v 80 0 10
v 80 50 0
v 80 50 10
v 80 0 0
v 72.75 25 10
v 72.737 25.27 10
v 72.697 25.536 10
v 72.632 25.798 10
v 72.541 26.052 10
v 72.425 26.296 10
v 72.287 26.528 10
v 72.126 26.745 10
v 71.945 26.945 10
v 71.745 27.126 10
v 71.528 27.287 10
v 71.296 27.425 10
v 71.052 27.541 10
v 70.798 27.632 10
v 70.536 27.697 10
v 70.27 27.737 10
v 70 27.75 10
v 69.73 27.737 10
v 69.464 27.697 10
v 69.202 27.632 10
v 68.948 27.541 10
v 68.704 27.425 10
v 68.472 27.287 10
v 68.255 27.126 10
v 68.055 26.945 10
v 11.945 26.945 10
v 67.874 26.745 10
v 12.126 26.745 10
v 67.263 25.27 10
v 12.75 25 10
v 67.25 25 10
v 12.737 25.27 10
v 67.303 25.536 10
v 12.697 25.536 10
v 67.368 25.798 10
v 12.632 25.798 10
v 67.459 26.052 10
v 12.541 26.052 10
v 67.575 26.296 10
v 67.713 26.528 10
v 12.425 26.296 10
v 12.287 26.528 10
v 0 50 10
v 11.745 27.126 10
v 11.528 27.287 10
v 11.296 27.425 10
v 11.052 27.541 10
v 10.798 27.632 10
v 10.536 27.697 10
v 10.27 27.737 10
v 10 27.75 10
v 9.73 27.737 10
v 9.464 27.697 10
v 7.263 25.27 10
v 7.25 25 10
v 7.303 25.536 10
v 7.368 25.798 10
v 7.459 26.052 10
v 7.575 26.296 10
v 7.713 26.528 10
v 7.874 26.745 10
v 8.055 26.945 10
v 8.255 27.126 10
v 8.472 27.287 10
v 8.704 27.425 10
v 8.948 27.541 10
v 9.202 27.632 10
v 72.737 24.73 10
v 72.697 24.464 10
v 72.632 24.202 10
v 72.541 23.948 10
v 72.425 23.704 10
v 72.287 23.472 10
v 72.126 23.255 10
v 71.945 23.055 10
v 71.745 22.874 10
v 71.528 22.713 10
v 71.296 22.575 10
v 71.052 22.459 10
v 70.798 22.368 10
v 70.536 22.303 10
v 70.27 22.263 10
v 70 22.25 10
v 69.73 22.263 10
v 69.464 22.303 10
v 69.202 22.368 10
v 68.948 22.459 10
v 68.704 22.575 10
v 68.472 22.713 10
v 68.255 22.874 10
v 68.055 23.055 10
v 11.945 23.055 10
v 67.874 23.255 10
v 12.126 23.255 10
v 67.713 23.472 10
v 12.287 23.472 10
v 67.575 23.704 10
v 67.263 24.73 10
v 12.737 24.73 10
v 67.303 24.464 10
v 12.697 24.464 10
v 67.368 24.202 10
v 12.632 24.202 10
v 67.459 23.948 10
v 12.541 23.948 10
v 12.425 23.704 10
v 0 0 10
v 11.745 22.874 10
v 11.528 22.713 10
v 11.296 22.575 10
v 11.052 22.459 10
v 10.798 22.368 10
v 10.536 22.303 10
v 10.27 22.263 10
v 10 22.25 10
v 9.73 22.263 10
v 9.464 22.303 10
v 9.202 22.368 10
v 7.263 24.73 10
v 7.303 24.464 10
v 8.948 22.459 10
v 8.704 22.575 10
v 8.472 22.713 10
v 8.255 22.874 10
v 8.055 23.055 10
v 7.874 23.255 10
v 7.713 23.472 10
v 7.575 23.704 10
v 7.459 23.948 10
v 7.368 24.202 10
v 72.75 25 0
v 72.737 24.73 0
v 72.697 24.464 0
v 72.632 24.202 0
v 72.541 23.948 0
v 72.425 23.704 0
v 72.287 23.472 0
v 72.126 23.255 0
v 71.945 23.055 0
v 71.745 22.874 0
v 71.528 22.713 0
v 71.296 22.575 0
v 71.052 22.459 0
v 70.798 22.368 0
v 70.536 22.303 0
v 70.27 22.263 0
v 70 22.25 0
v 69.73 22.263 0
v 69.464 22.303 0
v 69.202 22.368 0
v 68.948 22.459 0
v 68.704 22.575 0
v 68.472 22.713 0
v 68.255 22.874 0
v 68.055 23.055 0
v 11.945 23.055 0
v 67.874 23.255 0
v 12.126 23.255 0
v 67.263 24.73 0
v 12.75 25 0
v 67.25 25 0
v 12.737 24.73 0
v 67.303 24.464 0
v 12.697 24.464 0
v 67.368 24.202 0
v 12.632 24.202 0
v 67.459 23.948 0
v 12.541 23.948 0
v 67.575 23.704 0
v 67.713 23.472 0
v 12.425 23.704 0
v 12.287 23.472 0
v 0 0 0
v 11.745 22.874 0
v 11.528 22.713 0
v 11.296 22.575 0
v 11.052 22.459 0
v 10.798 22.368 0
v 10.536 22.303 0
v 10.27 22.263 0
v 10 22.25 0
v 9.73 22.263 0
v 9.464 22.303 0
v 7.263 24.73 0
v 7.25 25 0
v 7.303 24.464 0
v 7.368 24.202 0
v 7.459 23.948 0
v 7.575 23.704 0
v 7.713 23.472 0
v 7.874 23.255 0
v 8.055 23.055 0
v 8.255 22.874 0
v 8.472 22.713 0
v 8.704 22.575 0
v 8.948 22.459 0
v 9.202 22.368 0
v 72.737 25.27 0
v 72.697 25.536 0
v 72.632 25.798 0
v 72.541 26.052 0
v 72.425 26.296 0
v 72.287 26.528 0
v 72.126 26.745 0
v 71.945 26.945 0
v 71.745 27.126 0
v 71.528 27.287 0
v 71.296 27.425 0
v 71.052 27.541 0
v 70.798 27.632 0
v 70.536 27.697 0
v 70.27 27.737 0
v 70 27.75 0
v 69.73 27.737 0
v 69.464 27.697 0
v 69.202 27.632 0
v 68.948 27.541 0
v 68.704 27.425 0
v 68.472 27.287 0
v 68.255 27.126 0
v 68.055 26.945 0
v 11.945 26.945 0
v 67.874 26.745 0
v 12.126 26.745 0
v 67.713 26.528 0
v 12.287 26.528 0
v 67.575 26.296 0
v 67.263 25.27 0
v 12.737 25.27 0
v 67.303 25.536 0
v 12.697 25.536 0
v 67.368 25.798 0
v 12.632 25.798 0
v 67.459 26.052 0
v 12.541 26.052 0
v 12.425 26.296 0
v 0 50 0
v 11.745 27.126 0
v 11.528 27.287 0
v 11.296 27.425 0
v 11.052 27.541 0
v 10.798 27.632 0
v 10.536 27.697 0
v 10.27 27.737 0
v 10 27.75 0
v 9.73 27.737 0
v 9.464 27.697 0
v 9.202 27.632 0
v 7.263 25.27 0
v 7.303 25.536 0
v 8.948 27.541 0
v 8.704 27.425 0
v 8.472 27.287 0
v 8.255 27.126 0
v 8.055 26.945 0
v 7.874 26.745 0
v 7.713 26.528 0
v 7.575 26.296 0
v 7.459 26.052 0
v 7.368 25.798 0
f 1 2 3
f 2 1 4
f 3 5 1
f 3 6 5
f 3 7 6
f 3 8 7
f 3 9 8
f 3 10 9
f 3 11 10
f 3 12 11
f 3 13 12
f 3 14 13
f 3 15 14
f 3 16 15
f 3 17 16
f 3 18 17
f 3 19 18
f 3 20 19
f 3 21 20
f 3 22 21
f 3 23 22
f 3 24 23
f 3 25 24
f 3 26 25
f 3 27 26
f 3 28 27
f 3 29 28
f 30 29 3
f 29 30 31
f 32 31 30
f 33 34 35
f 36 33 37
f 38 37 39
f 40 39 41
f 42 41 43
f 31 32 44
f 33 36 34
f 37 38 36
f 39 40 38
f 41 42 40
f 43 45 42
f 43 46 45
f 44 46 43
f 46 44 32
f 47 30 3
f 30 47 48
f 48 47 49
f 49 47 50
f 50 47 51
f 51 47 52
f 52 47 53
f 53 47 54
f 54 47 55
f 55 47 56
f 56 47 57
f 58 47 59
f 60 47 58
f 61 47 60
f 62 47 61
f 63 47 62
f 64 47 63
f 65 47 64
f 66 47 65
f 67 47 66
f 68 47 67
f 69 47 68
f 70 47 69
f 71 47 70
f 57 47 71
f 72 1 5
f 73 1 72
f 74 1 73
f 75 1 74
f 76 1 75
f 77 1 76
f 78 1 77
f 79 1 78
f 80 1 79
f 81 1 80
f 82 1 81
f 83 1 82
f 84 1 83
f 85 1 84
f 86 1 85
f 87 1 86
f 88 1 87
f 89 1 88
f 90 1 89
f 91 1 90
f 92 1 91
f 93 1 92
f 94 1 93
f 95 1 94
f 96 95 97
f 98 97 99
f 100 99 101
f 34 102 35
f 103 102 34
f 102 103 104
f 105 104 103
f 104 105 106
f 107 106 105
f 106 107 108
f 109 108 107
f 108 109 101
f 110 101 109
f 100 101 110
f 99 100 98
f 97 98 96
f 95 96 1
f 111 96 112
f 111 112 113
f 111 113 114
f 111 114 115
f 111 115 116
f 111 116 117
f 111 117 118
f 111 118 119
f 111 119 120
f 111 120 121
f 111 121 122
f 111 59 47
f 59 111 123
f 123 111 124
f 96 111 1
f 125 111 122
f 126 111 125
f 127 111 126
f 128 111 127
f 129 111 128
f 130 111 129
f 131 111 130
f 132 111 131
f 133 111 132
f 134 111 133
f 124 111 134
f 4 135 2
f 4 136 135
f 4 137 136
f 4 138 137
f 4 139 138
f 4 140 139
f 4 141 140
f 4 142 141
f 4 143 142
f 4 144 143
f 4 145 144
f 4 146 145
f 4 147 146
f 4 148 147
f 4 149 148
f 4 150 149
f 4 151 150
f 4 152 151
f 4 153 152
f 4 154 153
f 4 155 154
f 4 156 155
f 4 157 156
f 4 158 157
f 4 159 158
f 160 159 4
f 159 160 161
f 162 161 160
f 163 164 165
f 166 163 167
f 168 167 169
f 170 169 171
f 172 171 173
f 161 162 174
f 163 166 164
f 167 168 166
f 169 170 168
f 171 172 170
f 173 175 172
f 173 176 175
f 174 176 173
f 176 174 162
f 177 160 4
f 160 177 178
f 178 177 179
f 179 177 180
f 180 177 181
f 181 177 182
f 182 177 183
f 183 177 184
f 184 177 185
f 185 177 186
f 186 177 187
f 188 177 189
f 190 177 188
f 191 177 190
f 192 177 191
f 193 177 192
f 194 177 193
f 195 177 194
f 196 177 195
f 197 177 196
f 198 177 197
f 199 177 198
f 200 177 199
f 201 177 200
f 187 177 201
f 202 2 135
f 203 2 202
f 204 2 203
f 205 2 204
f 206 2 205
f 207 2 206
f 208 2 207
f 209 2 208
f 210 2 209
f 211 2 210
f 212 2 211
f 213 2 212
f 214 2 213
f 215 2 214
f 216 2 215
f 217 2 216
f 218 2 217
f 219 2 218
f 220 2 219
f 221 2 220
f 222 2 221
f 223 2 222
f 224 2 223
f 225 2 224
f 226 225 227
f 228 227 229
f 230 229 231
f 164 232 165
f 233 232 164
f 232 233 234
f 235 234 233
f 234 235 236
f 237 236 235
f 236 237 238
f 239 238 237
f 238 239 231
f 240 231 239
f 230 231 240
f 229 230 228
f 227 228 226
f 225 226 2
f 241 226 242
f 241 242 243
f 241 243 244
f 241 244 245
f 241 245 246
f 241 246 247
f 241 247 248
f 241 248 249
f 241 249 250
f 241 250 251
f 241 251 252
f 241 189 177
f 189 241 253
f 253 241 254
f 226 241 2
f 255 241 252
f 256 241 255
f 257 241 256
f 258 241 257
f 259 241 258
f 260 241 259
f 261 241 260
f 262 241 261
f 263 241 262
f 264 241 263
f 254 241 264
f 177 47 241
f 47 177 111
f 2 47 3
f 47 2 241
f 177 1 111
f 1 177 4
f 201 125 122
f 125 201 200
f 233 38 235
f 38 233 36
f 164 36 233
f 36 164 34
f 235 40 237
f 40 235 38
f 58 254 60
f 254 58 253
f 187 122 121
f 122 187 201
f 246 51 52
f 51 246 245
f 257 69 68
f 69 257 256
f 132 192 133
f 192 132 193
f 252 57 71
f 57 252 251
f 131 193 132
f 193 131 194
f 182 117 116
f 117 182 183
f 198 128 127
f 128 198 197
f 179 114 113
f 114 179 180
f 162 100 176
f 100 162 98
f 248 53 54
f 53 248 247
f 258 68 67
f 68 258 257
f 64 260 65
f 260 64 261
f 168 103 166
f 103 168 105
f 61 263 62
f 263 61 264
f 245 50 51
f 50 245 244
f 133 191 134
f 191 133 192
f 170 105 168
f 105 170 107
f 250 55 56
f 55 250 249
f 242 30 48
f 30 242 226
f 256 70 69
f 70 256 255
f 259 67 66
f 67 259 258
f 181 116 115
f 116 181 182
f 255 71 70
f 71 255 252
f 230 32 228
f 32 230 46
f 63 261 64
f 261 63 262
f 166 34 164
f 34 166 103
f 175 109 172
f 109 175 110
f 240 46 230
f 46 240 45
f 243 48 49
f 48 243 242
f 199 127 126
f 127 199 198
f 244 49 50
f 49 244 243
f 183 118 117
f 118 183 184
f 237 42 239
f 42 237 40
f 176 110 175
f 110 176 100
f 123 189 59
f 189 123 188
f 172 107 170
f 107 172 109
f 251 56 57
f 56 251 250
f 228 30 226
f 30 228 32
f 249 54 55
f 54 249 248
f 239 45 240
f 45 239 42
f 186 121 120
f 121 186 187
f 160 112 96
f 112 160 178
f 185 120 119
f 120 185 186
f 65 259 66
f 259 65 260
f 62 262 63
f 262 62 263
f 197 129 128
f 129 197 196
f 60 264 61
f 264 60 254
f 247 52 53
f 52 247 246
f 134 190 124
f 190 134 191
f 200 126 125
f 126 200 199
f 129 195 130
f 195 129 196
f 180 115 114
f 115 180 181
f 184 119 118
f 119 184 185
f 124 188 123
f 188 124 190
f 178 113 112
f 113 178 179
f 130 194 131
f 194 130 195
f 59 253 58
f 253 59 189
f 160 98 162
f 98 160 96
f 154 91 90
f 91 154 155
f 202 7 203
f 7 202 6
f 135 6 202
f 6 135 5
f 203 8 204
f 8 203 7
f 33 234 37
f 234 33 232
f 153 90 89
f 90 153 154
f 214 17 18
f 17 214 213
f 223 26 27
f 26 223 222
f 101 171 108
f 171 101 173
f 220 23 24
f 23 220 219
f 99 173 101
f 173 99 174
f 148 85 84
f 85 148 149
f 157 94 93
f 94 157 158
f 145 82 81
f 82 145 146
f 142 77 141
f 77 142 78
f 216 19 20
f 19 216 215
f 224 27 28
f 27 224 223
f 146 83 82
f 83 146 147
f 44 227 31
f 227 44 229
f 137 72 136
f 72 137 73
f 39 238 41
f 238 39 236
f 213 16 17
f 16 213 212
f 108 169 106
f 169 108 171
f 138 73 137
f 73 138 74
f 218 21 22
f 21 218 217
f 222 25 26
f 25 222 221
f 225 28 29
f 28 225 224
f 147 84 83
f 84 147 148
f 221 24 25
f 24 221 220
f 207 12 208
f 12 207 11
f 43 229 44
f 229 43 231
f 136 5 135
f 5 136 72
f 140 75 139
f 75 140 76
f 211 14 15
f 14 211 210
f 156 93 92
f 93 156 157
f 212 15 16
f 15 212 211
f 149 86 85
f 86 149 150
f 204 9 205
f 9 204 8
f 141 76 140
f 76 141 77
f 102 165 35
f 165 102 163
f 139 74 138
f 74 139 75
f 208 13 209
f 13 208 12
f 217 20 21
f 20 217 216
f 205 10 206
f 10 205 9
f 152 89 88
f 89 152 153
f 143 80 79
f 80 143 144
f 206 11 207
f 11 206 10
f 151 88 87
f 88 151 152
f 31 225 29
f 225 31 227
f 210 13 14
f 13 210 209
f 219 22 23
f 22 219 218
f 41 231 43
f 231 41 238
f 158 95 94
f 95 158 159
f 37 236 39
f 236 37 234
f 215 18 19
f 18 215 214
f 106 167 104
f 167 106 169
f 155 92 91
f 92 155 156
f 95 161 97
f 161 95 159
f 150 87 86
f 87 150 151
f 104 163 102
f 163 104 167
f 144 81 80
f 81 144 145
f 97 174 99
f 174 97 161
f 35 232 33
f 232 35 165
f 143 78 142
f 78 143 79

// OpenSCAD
// file: ../../config.scad
// Ebike Configuration
// All dimensions in mm

// =============================================================================
// RIDER PARAMETERS
// =============================================================================
rider_height = 173;
rider_weight = 55;

// =============================================================================
// FRAME GEOMETRY
// =============================================================================
frame_size = 520;                    // Seat tube center-to-top
top_tube_effective = 545;
head_tube_length = 140;
head_tube_angle = 70;
seat_tube_angle = 72;
chainstay_length = 460;
bb_drop = 65;
wheelbase = 1080;
standover_height = 450;              // Step-through
stack = 620;
reach = 370;

// =============================================================================
// TUBE DIAMETERS
// =============================================================================
head_tube_id = 44;                   // 1-1/8" straight steerer
head_tube_od = 49;
seat_tube_id = 27.2;                 // Standard seatpost
down_tube_od = 44;
top_tube_od = 32;
seat_stay_od = 16;
chainstay_od = 22;

// =============================================================================
// MOTOR CONFIGURATION
// =============================================================================
motor_type = "mid-drive";
bb_shell_width = 68;                 // BSA standard
bb_clearance_width = 120;

// =============================================================================
// DROPOUT PARAMETERS
// =============================================================================
dropout_material = "6061-T6";
dropout_thickness = 10;
dropout_width = 45;
dropout_height = 80;
dropout_axle_spacing = 142;          // Boost thru-axle
dropout_axle_diameter = 12;

// =============================================================================
// BOTTOM BRACKET SHELL
// =============================================================================
bb_shell_od = 42;
bb_shell_id = 34.8;                  // BSA threaded
bb_thread_tpi = 24;                  // BSA 1.37" x 24 TPI

// =============================================================================
// HEAD TUBE
// =============================================================================
// Uses head_tube_length, head_tube_id, head_tube_od from above

// =============================================================================
// SEAT COLLAR
// =============================================================================
seat_collar_id = 31.8;               // For 27.2mm post with shim
seat_collar_od = 38;
seat_collar_height = 25;

// =============================================================================
// MOTOR MOUNT
// =============================================================================
motor_mount_thickness = 8;
motor_mount_width = 120;
motor_mount_height = 100;

// =============================================================================
// BATTERY MOUNT
// =============================================================================
battery_mount_thickness = 6;
battery_mount_width = 60;
battery_mount_height = 40;
battery_mount_quantity = 4;

// =============================================================================
// BRAKE MOUNT (Post Mount)
// =============================================================================
brake_mount_thickness = 10;
brake_mount_width = 80;
brake_mount_height = 50;
brake_post_bolt_spacing = 74;        // Post mount standard
brake_rotor_size_front = 180;
brake_rotor_size_rear = 160;

// =============================================================================
// CABLE GUIDES
// =============================================================================
cable_guide_length = 25;
cable_guide_width = 15;
cable_guide_height = 8;
cable_guide_quantity = 6;

// =============================================================================
// HEADSET CUPS
// =============================================================================
headset_cup_od = 44;
headset_bearing_seat = 30;

// =============================================================================
// RACK/FENDER MOUNTS
// =============================================================================
rack_mount_length = 30;
rack_mount_width = 20;
rack_mount_height = 10;
rack_mount_thread = 5;               // M5
rack_mount_quantity = 4;

// =============================================================================
// GUSSET PLATES
// =============================================================================
gusset_thickness = 6;
gusset_width = 80;
gusset_height = 60;
gusset_quantity = 2;

// =============================================================================
// COMPOSITE FRAME TUBES (FibreSeeker 3)
// =============================================================================
// Wall thickness for carbon fiber reinforced tubes
tube_wall_thickness = 3;

// Down tube (curved for step-through)
down_tube_length = 650;              // Along curve
down_tube_curve_radius = 800;        // Radius of curve

// Seat tube
seat_tube_length = 520;              // frame_size
seat_tube_od = 34;                   // Outer diameter

// Chainstays
chainstay_wall = 2.5;

// Seat stays
seat_stay_length = 480;
seat_stay_wall = 2;

// =============================================================================
// TUBE SECTIONING (for build volume constraints)
// =============================================================================
// Joint design: internal aluminum sleeve with M6 through-bolts
joint_overlap = 30;                  // Overlap length per joint
joint_bolt_diameter = 6;             // M6 bolts
joint_bolt_count = 2;                // Bolts per joint

// Section counts
down_tube_sections = 3;
seat_tube_sections = 2;
chainstay_sections = 2;
seat_stay_sections = 2;

// Sleeve parameters (CNC milled aluminum)
sleeve_wall_thickness = 2;
sleeve_length = 60;                  // Total sleeve length (2x overlap)

// =============================================================================
// MANUFACTURING TOLERANCES
// =============================================================================
tolerance_press_fit = 0.05;
tolerance_general = 0.1;

// =============================================================================
// COMMON CONSTANTS
// =============================================================================
$fn = 64;                            // Circle resolution
epsilon = 0.01;                      // For boolean operations
// main file
// Disc Brake Mount (Post Mount)
// CNC milled component for NestWorks C500

include <../../config.scad>

module brake_mount() {
    difference() {
        // Main body
        cube([brake_mount_width, brake_mount_height, brake_mount_thickness]);

        // Post mount holes (74mm spacing) - M6 threaded
        // These are tapped holes for caliper bolts
        translate([brake_mount_width/2, brake_mount_height/2 - brake_post_bolt_spacing/2, -epsilon])
            cylinder(h = brake_mount_thickness + 2*epsilon, d = 5);  // M6 tap drill
        translate([brake_mount_width/2, brake_mount_height/2 + brake_post_bolt_spacing/2, -epsilon])
            cylinder(h = brake_mount_thickness + 2*epsilon, d = 5);  // M6 tap drill

        // Frame mounting holes (M5)
        translate([10, brake_mount_height/2, -epsilon])
            cylinder(h = brake_mount_thickness + 2*epsilon, d = 5.5);
        translate([brake_mount_width - 10, brake_mount_height/2, -epsilon])
            cylinder(h = brake_mount_thickness + 2*epsilon, d = 5.5);
    }
}

// Render for preview
brake_mount();
